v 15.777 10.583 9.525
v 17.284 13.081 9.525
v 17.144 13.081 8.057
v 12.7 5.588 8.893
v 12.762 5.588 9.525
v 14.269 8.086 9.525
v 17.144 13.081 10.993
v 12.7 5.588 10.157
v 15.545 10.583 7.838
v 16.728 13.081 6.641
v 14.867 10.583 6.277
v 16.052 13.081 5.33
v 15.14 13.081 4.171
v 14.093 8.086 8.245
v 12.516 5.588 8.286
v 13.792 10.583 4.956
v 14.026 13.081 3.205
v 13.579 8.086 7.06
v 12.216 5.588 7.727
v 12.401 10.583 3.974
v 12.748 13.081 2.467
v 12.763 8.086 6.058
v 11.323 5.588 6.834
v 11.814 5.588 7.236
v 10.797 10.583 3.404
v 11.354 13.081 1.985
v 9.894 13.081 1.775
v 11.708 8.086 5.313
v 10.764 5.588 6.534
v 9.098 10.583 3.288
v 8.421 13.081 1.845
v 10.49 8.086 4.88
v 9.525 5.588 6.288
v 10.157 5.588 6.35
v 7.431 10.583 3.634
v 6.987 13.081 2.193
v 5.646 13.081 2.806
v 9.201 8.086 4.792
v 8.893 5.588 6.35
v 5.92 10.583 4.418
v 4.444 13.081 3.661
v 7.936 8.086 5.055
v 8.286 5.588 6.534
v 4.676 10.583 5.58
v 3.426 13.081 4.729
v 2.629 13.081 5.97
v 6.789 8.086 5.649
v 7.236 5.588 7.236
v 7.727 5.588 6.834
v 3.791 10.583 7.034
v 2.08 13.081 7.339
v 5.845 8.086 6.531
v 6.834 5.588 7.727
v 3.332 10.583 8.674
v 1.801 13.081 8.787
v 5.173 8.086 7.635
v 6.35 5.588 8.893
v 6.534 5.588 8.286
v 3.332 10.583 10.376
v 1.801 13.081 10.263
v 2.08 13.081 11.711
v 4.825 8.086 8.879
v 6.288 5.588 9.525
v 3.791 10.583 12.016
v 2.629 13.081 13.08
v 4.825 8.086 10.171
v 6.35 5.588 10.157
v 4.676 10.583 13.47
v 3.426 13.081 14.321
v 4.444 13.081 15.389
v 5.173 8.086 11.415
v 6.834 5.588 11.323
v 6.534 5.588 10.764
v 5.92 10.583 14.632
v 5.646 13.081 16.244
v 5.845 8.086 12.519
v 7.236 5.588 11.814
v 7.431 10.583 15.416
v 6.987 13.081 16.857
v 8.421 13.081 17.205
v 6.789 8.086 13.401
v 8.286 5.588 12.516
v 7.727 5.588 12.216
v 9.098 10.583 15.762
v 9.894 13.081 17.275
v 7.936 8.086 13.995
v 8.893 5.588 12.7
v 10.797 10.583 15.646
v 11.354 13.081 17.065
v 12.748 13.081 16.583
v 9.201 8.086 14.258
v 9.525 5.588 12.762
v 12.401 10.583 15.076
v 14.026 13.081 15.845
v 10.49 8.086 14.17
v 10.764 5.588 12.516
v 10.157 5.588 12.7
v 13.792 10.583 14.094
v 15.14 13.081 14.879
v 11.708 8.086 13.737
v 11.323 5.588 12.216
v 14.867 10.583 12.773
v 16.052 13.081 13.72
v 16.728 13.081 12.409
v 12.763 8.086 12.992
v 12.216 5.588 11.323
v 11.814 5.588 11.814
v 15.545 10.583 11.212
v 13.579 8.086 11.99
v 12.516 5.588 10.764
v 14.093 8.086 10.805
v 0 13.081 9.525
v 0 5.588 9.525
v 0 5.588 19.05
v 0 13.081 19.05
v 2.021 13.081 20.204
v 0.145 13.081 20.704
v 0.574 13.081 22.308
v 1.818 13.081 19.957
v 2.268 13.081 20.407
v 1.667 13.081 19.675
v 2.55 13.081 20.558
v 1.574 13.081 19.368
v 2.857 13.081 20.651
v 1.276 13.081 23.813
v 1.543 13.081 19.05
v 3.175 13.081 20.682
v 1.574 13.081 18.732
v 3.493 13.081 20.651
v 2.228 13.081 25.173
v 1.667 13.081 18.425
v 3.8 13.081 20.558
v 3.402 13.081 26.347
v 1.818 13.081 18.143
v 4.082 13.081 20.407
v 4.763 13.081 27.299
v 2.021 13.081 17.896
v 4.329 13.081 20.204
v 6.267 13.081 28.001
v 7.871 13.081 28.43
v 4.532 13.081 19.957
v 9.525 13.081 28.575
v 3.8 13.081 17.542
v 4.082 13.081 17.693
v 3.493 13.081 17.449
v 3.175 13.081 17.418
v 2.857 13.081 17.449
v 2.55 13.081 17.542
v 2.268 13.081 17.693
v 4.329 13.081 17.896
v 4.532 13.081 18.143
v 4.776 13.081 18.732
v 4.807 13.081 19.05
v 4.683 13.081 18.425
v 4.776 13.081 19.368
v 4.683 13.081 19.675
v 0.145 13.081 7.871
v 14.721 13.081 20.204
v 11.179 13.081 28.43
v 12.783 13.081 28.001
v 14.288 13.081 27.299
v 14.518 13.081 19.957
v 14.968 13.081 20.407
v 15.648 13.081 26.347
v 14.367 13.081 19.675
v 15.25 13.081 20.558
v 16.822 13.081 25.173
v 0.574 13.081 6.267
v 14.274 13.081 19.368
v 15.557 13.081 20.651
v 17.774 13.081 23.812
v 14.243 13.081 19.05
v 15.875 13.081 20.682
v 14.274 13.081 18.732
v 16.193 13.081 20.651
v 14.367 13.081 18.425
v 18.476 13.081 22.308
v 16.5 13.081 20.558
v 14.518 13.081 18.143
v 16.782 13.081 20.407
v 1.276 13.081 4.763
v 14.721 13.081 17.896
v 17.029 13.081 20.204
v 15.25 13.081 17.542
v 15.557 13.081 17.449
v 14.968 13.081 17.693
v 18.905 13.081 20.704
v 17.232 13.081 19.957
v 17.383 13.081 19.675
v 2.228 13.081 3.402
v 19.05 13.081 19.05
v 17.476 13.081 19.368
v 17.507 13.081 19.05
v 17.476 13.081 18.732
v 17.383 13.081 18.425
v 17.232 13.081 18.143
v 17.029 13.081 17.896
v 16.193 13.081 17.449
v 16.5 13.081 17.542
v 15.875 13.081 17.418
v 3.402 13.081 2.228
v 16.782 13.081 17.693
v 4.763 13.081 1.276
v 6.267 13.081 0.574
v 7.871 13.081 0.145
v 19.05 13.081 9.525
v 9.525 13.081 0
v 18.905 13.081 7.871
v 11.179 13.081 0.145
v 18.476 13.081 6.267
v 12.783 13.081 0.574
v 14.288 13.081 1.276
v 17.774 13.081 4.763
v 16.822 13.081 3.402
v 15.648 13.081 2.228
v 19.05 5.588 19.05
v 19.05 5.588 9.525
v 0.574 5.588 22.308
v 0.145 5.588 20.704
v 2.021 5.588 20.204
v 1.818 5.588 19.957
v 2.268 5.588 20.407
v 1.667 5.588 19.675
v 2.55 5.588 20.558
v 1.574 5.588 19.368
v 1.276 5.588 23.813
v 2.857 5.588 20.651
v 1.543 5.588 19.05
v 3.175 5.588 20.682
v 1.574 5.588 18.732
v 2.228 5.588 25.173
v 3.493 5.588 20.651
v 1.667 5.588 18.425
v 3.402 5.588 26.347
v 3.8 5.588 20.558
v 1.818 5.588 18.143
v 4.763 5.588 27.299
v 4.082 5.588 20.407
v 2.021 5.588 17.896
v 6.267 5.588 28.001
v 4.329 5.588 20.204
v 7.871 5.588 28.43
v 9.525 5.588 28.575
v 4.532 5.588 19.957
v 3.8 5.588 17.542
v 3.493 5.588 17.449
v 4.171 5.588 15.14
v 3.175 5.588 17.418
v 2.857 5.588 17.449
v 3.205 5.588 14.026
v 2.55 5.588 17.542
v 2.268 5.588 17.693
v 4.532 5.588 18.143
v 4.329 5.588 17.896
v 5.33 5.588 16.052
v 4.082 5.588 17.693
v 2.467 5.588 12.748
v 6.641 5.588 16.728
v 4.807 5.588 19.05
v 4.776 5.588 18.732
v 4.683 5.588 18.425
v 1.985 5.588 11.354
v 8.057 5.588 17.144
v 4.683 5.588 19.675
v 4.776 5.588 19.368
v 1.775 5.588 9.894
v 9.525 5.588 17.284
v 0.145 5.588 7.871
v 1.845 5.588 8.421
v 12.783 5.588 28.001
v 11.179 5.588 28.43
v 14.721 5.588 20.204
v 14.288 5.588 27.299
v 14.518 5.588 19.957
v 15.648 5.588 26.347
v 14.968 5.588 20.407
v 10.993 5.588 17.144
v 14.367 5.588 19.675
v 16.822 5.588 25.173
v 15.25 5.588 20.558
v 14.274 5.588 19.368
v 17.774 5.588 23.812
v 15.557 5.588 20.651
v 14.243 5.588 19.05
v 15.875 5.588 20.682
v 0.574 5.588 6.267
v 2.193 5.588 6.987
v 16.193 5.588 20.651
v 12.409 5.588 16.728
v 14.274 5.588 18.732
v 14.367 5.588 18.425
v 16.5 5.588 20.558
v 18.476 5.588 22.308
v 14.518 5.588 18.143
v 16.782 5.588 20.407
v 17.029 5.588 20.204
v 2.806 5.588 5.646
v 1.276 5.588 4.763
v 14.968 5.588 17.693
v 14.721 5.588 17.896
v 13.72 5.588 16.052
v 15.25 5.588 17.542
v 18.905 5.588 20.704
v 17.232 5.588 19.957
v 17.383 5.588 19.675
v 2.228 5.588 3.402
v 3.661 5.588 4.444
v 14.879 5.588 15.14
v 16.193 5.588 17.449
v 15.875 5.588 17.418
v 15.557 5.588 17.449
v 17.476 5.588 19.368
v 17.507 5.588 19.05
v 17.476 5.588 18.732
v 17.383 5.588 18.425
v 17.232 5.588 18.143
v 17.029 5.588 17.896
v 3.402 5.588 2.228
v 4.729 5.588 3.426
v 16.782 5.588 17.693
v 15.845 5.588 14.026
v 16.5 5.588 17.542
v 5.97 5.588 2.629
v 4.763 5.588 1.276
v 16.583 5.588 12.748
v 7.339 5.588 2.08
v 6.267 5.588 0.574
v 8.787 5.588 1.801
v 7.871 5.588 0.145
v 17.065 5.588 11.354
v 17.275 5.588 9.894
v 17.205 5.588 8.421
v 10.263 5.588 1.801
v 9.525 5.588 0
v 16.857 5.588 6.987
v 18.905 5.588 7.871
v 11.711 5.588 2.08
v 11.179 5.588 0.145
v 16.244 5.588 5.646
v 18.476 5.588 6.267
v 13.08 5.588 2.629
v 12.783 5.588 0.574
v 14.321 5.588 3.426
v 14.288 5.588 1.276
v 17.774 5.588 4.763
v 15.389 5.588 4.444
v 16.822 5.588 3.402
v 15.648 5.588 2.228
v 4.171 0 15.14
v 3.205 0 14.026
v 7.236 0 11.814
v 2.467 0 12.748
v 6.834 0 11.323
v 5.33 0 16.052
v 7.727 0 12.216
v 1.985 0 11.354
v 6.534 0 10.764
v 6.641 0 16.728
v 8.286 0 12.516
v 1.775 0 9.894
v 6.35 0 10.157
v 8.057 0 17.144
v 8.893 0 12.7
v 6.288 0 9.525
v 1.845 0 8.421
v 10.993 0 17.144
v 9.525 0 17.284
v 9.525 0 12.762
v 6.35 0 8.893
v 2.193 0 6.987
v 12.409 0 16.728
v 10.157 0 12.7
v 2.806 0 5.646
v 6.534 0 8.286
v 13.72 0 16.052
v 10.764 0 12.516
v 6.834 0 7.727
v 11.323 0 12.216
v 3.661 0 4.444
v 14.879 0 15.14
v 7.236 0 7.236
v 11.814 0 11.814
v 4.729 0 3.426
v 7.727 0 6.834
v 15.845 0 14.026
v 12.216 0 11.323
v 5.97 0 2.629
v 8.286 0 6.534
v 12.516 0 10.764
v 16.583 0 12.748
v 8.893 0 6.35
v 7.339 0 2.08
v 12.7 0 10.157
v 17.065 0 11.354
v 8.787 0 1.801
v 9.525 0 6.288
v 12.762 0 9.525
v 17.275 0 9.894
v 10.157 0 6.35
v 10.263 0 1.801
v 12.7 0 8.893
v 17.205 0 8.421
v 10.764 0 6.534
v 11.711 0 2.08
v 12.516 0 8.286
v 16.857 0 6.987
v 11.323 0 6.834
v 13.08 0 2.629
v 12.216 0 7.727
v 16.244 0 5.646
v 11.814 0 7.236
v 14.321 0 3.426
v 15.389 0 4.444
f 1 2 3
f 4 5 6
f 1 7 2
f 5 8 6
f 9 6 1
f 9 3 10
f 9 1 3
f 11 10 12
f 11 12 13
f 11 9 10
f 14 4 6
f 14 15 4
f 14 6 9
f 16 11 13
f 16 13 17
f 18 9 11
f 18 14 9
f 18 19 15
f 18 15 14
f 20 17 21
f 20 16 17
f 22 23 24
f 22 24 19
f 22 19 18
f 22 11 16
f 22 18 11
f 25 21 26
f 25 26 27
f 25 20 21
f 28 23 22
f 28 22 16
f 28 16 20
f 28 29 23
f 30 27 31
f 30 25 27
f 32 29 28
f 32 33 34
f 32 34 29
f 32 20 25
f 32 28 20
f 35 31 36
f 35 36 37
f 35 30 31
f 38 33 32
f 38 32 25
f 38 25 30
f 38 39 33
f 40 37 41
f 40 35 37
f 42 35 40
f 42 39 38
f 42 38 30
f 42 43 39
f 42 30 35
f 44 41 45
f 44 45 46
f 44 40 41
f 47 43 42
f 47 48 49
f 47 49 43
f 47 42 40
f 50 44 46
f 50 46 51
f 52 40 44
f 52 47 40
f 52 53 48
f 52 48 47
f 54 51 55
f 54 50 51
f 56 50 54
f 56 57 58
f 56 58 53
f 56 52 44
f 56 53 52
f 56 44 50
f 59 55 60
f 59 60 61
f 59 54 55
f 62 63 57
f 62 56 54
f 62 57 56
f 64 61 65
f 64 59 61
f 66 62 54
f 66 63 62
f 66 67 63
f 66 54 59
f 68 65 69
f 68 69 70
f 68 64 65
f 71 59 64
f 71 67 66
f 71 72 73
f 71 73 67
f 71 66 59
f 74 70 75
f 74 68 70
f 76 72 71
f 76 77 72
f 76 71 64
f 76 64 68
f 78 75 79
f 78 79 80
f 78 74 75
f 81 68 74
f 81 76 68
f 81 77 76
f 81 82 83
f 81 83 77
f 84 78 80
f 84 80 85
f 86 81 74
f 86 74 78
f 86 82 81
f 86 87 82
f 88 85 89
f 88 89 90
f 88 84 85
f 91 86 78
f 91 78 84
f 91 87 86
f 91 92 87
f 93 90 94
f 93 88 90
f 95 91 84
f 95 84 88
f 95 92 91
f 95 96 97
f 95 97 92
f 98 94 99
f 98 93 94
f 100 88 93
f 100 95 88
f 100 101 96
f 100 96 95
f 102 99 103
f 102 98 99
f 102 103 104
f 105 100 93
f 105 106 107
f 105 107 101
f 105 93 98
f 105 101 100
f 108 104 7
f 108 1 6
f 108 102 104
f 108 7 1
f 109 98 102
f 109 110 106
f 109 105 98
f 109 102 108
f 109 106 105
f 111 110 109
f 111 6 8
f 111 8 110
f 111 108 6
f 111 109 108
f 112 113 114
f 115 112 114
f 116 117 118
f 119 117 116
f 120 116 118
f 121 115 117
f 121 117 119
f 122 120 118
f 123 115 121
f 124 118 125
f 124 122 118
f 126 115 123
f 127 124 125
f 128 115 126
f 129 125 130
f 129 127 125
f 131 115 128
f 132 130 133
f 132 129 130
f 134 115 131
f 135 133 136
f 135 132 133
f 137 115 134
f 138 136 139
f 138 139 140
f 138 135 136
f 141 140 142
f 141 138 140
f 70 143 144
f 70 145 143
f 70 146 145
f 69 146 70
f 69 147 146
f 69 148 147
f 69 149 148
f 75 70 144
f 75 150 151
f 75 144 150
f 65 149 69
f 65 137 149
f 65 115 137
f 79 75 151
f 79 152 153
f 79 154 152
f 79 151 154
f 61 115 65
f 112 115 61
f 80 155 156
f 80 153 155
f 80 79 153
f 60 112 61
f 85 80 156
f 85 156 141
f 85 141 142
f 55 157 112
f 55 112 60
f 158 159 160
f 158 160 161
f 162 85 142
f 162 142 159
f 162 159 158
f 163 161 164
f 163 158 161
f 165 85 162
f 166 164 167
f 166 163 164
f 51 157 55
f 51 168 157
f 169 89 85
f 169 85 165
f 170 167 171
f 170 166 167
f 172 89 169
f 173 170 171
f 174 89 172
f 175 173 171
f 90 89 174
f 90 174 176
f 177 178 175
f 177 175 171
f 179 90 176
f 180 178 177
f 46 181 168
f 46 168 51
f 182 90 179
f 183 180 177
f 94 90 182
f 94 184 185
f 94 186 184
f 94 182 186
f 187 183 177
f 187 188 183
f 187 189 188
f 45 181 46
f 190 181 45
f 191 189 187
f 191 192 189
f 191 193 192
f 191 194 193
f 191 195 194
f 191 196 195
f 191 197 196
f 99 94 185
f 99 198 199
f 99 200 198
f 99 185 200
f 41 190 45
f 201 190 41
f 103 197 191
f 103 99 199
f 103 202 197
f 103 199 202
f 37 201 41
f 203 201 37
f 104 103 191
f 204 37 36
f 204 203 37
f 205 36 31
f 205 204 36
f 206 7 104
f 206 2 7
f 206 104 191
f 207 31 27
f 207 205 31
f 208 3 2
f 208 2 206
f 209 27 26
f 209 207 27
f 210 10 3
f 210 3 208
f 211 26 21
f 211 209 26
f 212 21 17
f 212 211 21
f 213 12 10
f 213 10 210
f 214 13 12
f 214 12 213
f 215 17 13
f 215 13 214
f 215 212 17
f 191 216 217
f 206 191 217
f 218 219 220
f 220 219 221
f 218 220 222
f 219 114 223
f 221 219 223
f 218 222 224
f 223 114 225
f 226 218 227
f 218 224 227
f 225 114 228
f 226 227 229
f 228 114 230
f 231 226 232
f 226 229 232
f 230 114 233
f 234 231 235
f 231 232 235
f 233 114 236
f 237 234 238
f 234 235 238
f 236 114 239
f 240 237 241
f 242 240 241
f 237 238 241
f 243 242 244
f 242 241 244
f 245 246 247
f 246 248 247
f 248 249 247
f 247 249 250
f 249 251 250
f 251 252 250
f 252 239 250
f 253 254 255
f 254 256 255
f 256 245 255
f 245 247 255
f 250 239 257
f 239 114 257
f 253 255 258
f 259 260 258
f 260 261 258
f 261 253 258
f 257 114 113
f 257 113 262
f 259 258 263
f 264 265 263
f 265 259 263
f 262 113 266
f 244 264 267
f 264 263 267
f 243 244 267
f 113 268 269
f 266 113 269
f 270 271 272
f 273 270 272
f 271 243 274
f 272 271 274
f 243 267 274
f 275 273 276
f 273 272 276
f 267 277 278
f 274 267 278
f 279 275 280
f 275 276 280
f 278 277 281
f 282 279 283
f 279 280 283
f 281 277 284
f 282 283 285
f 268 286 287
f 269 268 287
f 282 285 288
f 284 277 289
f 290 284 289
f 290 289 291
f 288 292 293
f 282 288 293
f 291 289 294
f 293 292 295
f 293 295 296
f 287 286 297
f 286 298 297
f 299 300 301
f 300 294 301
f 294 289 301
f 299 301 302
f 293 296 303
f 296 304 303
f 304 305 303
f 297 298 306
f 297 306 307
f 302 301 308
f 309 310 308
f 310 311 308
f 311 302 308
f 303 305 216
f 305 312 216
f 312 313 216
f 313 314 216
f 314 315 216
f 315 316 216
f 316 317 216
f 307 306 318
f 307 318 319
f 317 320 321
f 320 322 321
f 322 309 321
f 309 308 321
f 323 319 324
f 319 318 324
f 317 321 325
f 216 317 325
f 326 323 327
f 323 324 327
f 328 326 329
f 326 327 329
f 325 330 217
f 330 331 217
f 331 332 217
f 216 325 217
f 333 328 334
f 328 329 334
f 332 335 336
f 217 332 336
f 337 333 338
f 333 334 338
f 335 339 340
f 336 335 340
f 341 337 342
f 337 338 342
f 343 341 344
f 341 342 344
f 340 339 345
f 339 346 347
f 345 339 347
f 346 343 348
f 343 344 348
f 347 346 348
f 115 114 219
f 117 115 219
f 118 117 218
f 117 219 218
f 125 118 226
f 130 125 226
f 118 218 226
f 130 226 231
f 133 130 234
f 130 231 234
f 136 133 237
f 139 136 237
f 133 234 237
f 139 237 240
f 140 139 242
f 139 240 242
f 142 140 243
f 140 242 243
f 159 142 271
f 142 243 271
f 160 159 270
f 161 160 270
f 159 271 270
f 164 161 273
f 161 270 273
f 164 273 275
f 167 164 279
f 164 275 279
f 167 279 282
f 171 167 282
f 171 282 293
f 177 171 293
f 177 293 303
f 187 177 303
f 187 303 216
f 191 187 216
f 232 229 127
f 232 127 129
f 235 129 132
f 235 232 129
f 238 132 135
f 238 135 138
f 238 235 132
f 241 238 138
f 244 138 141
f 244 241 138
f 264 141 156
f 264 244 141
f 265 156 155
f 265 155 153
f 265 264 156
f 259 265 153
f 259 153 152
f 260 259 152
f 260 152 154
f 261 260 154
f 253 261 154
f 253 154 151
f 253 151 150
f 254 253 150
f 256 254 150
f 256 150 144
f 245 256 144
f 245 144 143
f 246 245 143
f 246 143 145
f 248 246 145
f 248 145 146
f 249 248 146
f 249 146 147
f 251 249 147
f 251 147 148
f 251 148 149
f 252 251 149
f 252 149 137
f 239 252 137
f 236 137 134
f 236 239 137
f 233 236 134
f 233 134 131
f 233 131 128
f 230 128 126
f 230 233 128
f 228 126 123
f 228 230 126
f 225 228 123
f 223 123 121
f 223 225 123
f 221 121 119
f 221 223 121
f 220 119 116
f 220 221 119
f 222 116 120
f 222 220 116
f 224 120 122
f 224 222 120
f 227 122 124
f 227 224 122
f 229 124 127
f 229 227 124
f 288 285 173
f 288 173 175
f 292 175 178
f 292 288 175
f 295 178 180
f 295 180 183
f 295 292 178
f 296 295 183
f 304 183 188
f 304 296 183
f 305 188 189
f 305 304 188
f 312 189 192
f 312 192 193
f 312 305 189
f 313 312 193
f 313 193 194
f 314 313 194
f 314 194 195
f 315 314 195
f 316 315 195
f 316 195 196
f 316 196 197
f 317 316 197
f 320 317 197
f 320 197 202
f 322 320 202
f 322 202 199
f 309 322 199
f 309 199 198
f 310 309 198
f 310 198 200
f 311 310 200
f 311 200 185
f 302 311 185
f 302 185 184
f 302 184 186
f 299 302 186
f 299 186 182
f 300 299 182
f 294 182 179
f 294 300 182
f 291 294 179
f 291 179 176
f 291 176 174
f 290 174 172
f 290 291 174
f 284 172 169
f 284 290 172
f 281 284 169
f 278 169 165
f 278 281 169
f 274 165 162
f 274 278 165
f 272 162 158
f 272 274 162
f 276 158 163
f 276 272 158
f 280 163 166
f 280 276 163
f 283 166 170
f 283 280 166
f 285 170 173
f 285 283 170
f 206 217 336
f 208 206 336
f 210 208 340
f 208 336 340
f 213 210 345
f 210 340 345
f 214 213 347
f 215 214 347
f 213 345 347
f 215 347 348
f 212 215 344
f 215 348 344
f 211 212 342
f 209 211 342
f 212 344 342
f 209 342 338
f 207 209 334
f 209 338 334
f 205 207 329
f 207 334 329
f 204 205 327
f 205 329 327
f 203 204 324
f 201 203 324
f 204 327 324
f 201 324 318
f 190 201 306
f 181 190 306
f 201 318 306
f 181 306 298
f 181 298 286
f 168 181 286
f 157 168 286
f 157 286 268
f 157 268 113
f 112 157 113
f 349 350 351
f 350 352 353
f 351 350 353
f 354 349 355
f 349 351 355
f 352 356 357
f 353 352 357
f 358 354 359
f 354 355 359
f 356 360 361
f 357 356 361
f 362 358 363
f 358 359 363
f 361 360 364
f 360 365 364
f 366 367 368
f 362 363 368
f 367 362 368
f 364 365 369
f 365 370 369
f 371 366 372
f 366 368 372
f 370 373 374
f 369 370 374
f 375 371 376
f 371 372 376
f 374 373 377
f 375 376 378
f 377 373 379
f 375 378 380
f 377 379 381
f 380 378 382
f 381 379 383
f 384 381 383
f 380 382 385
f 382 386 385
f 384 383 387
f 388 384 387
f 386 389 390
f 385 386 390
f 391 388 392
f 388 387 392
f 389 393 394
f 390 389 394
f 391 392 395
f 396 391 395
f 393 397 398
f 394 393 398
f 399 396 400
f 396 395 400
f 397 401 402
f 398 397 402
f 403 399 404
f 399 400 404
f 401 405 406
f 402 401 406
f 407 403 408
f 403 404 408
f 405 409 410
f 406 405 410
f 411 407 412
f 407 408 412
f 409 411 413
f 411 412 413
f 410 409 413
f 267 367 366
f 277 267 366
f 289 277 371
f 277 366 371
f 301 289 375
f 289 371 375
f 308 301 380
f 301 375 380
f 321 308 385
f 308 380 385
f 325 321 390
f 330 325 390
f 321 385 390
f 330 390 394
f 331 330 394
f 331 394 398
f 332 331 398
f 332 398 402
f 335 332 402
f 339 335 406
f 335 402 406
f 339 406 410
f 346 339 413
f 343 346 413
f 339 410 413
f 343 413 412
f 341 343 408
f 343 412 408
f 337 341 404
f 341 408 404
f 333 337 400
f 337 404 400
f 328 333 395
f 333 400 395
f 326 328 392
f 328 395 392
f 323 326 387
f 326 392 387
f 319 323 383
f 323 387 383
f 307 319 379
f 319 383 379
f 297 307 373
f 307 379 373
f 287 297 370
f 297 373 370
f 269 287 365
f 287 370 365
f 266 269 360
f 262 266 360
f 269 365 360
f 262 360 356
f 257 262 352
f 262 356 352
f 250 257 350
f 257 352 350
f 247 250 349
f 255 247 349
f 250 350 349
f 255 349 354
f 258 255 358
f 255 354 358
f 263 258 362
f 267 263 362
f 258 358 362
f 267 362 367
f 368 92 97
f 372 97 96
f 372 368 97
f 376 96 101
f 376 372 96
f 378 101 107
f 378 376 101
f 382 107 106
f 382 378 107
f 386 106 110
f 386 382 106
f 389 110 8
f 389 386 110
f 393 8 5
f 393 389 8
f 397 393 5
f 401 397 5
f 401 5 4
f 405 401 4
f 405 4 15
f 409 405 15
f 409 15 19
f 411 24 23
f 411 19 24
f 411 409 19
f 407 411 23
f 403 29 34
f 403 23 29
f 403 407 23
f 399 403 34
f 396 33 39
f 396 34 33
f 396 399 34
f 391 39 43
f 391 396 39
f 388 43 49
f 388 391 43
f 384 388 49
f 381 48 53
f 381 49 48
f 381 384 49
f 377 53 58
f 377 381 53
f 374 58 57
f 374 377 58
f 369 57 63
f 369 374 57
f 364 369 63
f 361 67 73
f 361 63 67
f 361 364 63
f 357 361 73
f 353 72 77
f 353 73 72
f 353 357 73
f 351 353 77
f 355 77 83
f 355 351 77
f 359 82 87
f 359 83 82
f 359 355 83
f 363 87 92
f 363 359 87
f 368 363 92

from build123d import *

# Parameters (mm, degrees)
SKETCH_315_R        = 3.237023897
SKETCH_315_R_2      = 1.631949552
SKETCH_315_R_3      = 1.631949719
EXTRUDE_1058_DEPTH  = 13.081
SKETCH_4_R          = 7.758938489
SKETCH_4_R_2        = 1.631949552
SKETCH_4_R_3        = 1.631949719
SKETCH_4_R_4        = 3.237023897
CUT_EXTRUDE_3_DEPTH = 5.588
SKETCH_4_2_R        = 7.758938489
SKETCH_5_R          = 3.237023897


with BuildPart() as part:
    # Sketch 315 → Extrude 1058 (new body)
    with BuildSketch(Plane(origin=(0, 0, 0), x_dir=(1, 0, 0), z_dir=(0, 1, 0))):
        with BuildLine():
            Line((0, -9.525000572), (0, -19.050001144))
            ThreePointArc((0, -19.050001144), (9.525002003, -28.575000286), (19.050001144, -19.049998283))
            Line((19.050001144, -19.049998283), (19.050001144, -9.525000572))
            ThreePointArc((19.050001144, -9.525000572), (9.525000572, 0), (0, -9.525000572))
        make_face()
        with Locations(Location((9.525000572, -9.525000572, 0), (0, 0, 270))):
            Circle(SKETCH_315_R, mode=Mode.SUBTRACT)
        with Locations(Location((3.175000612, -19.049999854, 0), (0, 0, 270))):
            Circle(SKETCH_315_R_2, mode=Mode.SUBTRACT)
        with Locations(Location((15.874999739, -19.050000406, 0), (0, 0, 270))):
            Circle(SKETCH_315_R_3, mode=Mode.SUBTRACT)
    extrude(amount=EXTRUDE_1058_DEPTH)

    # Sketch 4 → 拉伸3 (cut)
    # profile 1 of 2: a face of its own
    with BuildSketch(Plane(origin=(0, 0, 0), x_dir=(1, 0, 0), z_dir=(0, 1, 0))):
        with BuildLine():
            Line((0, -9.525000572), (0, -19.050001144))
            ThreePointArc((0, -19.050001144), (9.525002003, -28.575000286), (19.050001144, -19.049998283))
            Line((19.050001144, -19.049998283), (19.050001144, -9.525000572))
            ThreePointArc((19.050001144, -9.525000572), (9.525000572, 0), (0, -9.525000572))
        make_face()
        with Locations(Location((9.525000572, -9.525000572, 0), (0, 0, 270))):
            Circle(SKETCH_4_R, mode=Mode.SUBTRACT)
        with Locations(Location((3.175000612, -19.049999854, 0), (0, 0, 270))):
            Circle(SKETCH_4_R_2, mode=Mode.SUBTRACT)
        with Locations(Location((15.874999739, -19.050000406, 0), (0, 0, 270))):
            Circle(SKETCH_4_R_3, mode=Mode.SUBTRACT)
    # profile 2 of 2: a face of its own
    with BuildSketch(Plane(origin=(0, 0, 0), x_dir=(1, 0, 0), z_dir=(0, 1, 0))):
        with Locations(Location((9.525000572, -9.525000572, 0), (0, 0, 270))):
            Circle(SKETCH_4_R_4)
    extrude(amount=CUT_EXTRUDE_3_DEPTH, mode=Mode.SUBTRACT)

    # Sketch 4 2 → 切除-放样1 section 0
    with BuildSketch(Plane(origin=(0, 13.081000328, 0), x_dir=(1, 0, 0), z_dir=(0, 1, 0))):
        with Locations((9.525000572, -9.525000572)):
            Circle(SKETCH_4_2_R)
    # 草图5 → 切除-放样1 section 1
    with BuildSketch(Plane.XZ.offset(-5.588000298)):
        with Locations((9.525000572, 9.525000572)):
            Circle(SKETCH_5_R)
    loft(mode=Mode.SUBTRACT)


solid = part.part
